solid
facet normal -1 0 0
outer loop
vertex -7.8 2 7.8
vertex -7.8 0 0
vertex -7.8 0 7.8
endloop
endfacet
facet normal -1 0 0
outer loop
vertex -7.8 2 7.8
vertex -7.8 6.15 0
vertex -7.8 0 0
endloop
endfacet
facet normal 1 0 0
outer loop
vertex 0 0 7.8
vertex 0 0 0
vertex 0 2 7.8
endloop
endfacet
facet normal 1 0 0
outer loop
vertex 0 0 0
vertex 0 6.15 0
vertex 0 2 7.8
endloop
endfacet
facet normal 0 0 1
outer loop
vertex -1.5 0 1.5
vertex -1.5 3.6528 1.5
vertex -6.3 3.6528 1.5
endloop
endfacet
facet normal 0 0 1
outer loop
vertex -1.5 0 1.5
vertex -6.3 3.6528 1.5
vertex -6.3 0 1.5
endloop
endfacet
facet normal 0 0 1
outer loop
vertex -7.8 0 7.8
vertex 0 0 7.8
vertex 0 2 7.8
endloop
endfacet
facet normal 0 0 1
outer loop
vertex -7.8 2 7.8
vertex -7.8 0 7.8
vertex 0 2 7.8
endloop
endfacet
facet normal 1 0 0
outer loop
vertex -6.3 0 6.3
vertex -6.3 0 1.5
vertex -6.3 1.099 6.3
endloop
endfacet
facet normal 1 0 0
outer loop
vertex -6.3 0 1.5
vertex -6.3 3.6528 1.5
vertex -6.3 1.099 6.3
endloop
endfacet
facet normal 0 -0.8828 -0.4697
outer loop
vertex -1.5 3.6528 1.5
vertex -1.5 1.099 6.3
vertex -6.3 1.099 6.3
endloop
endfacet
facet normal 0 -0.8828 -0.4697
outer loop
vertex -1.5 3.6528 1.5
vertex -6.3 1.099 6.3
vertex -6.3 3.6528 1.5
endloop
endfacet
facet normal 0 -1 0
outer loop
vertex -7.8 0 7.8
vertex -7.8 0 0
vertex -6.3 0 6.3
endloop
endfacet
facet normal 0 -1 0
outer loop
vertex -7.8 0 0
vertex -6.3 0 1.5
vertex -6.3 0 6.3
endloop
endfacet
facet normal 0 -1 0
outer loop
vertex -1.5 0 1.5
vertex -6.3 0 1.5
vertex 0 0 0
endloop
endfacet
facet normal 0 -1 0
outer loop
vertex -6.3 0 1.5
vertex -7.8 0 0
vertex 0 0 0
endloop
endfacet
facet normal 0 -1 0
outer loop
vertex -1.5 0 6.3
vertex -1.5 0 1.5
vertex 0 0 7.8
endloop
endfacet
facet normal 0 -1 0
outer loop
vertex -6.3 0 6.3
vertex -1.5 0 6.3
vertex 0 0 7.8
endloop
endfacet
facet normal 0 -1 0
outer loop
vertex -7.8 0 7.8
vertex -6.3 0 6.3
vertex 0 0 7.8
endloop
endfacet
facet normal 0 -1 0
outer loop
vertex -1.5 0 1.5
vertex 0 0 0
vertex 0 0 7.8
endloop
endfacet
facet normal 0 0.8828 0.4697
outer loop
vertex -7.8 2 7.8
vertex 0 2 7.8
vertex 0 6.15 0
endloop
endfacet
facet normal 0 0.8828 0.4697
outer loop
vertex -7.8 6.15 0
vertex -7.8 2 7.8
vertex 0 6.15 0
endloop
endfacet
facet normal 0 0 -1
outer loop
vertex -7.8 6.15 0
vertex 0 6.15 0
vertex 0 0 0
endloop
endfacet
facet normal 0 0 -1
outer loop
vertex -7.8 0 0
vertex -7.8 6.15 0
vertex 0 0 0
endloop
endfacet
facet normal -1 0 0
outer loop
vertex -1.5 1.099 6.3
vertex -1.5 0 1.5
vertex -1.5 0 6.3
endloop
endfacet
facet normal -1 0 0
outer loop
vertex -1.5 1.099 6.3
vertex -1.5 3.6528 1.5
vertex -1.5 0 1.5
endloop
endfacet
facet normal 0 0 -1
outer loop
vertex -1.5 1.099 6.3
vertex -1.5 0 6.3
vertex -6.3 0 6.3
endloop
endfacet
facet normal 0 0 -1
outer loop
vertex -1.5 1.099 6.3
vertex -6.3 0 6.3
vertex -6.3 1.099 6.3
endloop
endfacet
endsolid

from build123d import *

# Parameters (mm, degrees)
BOSS_EXTRUDE1_DEPTH = 7.8
SHELL1_T            = -1.5


with BuildPart() as part:
    # Sketch1 → Boss-Extrude1 (new body)
    with BuildSketch(Plane(origin=(0, 0, 0), x_dir=(0, 0, -1), z_dir=(1, 0, 0))):
        Polygon((0, 0), (-7.8, 0), (-7.8, 2), (0, 6.15), align=None)
    extrude(amount=-BOSS_EXTRUDE1_DEPTH)

    # Shell1
    shell1_openings = [part.faces().sort_by_distance(p)[0] for p in [
        (-3.9, 0, 3.9),
    ]]
    offset(amount=SHELL1_T, openings=shell1_openings, kind=Kind.INTERSECTION)


solid = part.part
